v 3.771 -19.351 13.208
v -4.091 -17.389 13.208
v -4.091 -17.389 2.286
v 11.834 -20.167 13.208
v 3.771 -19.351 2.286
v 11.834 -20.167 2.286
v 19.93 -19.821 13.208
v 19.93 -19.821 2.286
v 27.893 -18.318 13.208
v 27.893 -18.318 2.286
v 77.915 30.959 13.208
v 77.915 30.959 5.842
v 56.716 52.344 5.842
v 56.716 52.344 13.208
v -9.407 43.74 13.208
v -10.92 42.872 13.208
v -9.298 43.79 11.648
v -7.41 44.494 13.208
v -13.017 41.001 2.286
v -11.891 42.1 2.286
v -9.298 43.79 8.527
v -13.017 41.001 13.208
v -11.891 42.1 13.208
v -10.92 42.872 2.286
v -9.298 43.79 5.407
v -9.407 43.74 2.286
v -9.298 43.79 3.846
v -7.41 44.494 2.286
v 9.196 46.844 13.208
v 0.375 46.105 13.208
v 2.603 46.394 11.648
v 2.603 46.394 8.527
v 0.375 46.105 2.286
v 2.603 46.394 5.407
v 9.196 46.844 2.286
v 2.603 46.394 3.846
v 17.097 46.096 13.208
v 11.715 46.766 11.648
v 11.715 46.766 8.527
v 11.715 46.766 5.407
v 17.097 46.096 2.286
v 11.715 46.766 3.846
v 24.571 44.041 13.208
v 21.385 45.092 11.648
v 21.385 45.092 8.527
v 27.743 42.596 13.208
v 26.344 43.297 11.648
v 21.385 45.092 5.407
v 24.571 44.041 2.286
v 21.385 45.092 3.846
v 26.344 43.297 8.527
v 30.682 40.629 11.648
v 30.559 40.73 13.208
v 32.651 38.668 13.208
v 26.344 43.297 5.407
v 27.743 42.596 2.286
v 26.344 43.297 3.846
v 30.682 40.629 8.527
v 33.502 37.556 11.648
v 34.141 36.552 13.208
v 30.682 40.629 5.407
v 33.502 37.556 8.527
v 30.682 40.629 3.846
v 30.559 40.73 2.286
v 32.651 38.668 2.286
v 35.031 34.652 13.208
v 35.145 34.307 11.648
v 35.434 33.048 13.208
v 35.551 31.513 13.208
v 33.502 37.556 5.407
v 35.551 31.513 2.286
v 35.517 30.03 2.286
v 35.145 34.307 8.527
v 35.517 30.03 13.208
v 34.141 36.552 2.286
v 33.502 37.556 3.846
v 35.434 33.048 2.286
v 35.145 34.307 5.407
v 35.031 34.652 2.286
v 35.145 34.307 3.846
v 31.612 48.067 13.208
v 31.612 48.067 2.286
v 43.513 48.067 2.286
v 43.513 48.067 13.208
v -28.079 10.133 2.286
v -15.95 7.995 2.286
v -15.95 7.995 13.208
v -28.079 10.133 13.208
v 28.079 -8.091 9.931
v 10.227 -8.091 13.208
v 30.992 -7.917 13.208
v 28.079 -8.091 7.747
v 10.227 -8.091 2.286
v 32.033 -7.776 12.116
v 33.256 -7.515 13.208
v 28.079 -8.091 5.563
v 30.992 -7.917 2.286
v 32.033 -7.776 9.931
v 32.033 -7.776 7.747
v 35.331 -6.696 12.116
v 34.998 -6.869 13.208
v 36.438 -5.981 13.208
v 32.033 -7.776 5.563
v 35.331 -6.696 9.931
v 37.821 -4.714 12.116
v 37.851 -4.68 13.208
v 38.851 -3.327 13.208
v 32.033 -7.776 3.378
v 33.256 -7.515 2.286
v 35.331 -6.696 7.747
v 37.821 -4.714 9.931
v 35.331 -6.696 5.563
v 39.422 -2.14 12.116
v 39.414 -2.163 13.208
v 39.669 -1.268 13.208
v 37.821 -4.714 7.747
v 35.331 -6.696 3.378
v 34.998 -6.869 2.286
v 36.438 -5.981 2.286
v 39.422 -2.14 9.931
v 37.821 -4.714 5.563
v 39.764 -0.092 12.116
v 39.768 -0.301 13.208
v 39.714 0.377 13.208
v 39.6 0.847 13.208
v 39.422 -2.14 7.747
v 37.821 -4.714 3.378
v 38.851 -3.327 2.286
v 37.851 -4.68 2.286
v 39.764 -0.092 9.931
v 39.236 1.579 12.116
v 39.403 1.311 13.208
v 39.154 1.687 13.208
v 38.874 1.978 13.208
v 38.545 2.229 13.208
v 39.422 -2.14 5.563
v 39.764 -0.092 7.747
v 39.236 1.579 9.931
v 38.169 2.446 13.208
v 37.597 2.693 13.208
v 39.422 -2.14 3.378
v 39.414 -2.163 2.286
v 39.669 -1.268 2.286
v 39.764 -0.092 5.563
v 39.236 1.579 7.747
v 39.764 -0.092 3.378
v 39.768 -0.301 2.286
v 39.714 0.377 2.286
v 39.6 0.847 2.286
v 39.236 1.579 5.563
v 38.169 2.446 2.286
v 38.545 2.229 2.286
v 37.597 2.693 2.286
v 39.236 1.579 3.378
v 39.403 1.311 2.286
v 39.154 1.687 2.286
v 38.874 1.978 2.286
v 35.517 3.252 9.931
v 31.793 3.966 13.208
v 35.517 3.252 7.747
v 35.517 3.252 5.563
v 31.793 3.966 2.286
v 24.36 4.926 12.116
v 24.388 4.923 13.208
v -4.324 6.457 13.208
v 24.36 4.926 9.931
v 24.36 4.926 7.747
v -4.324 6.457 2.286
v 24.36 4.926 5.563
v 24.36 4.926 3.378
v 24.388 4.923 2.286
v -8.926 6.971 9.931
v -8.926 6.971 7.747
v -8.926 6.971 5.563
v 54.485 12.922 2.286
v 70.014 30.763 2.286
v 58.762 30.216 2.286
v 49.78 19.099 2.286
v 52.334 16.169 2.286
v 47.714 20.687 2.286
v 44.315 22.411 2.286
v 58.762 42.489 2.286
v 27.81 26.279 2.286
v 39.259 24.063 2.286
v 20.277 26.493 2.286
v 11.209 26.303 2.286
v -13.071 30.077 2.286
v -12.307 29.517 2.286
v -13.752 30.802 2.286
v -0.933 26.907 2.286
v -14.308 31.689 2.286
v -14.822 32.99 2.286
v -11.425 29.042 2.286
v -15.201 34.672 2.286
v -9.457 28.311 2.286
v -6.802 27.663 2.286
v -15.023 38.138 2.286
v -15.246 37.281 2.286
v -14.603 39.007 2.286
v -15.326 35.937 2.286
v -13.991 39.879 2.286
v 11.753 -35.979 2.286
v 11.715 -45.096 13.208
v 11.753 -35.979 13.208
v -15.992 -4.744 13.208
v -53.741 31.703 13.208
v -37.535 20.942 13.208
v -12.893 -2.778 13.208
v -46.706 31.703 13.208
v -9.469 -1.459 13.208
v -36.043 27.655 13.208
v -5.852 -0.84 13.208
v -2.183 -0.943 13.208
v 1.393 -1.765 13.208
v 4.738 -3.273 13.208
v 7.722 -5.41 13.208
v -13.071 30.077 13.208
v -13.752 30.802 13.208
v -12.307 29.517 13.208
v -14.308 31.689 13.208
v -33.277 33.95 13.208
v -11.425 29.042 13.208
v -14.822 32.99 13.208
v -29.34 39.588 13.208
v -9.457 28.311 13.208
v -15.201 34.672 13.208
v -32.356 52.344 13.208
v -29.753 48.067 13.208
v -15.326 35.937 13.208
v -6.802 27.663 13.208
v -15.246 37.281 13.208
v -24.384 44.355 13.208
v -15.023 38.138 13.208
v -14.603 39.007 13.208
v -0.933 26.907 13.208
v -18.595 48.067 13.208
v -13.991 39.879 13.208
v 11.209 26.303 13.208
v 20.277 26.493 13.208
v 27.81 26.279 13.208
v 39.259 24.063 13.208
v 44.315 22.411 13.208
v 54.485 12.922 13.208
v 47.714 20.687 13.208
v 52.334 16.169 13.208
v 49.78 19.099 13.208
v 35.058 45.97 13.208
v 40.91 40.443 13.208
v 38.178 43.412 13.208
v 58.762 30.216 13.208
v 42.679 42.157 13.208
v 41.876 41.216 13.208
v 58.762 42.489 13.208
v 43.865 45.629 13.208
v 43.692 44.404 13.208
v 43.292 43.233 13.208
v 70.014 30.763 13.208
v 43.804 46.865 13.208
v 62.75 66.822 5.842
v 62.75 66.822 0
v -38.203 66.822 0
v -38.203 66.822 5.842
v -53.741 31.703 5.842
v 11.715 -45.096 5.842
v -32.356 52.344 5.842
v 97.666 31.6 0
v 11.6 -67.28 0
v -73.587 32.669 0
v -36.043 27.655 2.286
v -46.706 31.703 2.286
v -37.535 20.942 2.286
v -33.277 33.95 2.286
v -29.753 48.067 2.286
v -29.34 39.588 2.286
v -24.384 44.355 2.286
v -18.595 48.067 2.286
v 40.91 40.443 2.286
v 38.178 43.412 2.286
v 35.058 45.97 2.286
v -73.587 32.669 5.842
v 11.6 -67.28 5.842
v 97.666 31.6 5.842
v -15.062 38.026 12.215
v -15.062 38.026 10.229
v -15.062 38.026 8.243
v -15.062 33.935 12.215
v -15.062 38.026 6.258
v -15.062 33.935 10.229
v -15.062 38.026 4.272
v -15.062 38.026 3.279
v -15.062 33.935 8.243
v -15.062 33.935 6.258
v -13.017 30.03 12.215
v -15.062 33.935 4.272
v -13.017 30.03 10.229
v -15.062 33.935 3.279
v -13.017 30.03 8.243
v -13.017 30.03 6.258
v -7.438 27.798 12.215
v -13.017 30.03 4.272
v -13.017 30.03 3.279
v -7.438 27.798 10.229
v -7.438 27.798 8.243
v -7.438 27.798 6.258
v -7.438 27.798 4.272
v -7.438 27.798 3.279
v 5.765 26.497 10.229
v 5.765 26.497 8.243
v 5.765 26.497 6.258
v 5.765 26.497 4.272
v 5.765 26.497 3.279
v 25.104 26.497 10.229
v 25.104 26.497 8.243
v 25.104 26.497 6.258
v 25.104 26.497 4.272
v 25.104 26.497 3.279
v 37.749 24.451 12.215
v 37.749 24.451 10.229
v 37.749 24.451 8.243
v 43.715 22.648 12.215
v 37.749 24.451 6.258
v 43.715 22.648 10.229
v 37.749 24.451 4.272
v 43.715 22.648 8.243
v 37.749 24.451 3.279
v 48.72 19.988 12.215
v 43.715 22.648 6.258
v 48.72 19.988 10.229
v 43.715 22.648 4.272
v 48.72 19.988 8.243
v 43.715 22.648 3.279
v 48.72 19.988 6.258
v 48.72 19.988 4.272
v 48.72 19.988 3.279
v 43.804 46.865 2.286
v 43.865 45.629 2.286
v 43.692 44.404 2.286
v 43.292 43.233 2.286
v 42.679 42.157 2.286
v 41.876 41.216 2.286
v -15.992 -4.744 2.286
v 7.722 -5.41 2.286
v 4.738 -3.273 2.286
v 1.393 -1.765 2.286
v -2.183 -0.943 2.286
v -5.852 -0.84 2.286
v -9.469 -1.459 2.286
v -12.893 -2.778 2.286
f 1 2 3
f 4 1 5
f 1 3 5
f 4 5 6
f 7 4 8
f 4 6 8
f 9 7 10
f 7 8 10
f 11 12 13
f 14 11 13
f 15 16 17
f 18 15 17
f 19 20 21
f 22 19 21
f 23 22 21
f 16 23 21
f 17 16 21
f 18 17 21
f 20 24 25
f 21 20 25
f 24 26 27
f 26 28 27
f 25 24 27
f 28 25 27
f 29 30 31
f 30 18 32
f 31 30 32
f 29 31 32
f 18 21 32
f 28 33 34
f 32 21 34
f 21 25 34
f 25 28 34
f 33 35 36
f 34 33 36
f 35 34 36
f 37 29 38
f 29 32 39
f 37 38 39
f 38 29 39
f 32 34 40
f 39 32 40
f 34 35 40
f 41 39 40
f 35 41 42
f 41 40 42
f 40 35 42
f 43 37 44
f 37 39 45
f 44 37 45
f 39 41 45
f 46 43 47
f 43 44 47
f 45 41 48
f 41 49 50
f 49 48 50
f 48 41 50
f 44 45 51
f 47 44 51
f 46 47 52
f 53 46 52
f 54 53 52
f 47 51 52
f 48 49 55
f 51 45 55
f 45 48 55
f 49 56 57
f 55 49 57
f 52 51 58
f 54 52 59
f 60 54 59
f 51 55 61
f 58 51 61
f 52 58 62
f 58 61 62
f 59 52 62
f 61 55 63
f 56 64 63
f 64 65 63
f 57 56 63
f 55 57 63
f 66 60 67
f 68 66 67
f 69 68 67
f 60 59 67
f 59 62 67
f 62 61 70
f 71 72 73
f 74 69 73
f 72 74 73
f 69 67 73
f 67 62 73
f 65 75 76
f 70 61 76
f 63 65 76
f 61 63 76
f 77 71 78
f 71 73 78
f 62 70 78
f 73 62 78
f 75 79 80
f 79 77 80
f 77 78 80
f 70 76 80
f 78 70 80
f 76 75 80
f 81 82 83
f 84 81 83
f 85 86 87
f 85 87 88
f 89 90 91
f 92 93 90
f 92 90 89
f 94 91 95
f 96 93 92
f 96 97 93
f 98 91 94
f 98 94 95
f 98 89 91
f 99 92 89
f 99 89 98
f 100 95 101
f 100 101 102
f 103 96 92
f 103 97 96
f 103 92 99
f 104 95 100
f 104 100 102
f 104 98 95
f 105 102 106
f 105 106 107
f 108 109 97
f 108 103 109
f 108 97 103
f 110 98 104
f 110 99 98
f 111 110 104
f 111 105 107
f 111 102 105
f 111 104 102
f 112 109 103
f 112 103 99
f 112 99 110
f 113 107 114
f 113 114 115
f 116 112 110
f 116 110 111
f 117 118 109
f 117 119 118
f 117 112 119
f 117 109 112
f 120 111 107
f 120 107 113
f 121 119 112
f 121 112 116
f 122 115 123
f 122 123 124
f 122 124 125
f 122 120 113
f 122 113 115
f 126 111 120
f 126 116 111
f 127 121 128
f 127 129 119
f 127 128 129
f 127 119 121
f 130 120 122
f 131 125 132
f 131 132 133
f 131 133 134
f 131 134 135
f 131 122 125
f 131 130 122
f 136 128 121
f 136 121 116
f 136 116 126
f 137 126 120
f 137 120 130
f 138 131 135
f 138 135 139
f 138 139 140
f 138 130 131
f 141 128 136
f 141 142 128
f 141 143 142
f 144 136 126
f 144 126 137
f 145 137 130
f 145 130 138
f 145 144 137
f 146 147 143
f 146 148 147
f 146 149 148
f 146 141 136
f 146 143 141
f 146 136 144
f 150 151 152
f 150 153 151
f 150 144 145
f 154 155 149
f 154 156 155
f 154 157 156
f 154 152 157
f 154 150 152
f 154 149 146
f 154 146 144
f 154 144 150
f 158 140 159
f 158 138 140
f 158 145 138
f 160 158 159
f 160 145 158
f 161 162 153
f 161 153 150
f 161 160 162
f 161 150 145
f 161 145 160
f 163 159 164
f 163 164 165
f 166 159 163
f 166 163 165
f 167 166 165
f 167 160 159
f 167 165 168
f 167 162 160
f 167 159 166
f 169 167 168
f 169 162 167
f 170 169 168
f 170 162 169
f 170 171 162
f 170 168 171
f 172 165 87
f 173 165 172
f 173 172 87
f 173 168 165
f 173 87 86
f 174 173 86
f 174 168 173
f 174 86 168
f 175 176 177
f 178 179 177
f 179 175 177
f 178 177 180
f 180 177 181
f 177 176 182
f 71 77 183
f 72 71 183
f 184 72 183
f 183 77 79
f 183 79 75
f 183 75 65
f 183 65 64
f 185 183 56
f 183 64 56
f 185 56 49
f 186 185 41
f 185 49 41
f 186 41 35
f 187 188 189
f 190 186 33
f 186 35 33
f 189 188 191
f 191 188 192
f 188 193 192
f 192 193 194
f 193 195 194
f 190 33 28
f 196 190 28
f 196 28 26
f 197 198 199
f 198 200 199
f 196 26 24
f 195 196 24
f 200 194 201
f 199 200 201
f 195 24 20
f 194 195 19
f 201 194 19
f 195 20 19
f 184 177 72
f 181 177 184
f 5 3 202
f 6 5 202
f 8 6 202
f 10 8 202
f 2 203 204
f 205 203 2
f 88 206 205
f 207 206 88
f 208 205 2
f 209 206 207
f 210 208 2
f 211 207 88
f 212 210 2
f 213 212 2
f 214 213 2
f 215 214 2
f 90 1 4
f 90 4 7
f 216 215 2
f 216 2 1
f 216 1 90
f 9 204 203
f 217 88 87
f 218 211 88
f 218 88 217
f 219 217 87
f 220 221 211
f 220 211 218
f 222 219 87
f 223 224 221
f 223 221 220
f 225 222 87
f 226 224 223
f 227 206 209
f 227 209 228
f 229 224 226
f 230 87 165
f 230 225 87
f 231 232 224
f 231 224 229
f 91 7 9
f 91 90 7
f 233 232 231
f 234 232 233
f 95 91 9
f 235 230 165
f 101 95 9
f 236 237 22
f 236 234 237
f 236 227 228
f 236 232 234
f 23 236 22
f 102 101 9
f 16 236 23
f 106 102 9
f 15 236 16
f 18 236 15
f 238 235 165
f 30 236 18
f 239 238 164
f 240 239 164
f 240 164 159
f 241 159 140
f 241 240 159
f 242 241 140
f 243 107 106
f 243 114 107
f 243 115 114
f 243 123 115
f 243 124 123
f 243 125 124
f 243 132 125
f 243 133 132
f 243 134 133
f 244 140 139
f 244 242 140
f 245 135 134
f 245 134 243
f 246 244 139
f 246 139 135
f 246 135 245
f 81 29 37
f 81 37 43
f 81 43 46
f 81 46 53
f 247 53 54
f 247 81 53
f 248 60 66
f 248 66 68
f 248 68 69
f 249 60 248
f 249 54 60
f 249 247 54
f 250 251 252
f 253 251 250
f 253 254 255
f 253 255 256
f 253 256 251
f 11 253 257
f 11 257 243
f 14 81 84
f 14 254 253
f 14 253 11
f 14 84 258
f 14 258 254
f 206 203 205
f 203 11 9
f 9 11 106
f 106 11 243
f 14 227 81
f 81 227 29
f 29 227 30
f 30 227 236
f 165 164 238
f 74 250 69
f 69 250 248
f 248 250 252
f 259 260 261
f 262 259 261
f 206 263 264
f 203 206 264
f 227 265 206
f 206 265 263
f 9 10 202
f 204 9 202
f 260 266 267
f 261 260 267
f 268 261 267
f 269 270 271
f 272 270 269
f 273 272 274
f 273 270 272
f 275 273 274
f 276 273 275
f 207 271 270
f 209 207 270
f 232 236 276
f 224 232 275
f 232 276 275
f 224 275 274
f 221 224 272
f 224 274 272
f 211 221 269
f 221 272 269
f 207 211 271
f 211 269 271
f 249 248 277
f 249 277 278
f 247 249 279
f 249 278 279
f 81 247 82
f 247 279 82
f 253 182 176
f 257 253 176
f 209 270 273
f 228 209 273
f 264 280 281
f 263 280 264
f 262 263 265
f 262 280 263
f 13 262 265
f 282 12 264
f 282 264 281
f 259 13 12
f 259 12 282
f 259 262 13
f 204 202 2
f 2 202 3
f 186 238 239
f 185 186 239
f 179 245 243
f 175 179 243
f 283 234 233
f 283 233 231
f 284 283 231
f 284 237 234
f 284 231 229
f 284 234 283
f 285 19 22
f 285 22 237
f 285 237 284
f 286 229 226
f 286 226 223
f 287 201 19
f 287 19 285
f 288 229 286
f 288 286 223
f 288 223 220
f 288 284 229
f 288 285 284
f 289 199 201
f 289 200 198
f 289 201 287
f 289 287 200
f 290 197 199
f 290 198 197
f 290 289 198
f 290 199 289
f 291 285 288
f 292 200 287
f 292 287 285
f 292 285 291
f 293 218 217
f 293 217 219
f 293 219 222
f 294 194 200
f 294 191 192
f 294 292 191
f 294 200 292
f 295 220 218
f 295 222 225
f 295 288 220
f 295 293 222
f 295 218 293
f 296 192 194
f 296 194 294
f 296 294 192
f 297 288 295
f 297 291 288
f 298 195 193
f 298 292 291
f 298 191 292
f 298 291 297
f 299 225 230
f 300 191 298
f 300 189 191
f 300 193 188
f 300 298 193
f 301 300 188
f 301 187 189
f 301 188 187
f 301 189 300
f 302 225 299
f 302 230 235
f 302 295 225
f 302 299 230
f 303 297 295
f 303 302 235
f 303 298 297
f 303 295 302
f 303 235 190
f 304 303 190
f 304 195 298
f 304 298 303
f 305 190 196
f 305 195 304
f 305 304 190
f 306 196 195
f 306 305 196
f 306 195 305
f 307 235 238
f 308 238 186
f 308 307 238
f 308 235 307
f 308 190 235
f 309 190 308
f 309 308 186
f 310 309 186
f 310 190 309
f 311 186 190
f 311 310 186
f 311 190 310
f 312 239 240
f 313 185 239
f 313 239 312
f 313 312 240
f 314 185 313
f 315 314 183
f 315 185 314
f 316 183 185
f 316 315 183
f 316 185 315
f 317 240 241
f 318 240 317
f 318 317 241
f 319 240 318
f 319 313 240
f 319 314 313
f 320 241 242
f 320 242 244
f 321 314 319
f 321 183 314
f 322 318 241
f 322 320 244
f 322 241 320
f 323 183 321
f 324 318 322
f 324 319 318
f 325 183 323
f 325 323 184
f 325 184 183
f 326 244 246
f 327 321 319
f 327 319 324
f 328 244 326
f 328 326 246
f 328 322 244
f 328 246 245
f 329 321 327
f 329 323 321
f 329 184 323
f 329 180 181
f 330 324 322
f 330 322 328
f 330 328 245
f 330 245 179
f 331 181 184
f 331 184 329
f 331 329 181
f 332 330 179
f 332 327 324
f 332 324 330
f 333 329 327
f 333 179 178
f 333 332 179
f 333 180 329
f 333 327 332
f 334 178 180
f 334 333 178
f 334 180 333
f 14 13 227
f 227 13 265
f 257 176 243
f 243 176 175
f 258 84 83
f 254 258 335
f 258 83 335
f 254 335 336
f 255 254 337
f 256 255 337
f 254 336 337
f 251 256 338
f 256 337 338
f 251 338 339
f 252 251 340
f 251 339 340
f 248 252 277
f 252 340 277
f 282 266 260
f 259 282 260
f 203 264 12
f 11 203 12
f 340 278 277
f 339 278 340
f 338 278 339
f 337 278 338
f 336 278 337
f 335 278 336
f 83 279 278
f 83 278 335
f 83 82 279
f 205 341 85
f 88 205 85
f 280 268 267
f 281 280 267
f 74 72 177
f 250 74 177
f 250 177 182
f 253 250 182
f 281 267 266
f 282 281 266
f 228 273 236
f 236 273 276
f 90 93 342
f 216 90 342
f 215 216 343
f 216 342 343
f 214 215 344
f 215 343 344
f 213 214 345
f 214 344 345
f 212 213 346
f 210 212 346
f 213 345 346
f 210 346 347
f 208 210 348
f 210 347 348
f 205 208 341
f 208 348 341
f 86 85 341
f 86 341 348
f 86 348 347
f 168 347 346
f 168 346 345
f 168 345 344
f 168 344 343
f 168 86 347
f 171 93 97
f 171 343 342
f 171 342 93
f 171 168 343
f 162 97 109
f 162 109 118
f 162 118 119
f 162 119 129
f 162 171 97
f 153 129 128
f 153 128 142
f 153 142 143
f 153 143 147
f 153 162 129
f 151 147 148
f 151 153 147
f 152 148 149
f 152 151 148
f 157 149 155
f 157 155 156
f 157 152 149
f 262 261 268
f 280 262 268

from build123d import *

# Parameters (mm, degrees)
F1_DEPTH = 13.208
F3_DEPTH = 5.842
F4_DEPTH = 2.286


with BuildPart() as f1:
    # F0 (on Top) → F1 (new body)
    with BuildSketch(Plane.XY):
        Polygon((-32.3560461402, 52.3441955447), (-53.7407882512, 31.7032672465), (11.7151224986, -45.0958572328), (77.9148489237, 30.9594497085), (56.7160658538, 52.3441955447), align=None)
        with BuildLine():
            Line((11.7534588652, -35.9788919642), (-4.0909931995, -17.3886679113))
            ThreePointArc((-4.0909931995, -17.3886679113), (11.8338253195, -20.1670289266), (27.8931483626, -18.3184407651))
            Line((27.8931483626, -18.3184407651), (11.7534588652, -35.9788919642))
        make_face(mode=Mode.SUBTRACT)
        with BuildLine():
            Line((-15.9920677543, -4.7437758185), (-28.0790962279, 10.132567957))
            add(Edge.make_bspline(
                [(10.2274892852, -8.0909533426), (12.1311980321, -8.0811949568), (16.6056392449, -8.0582590306), (28.0675694172, -8.260866764), (35.4281055247, -7.6163836537), (40.0045754864, -2.566455147), (39.8246795693, 2.1720673748), (35.0407493301, 3.4771529183), (23.8681432212, 5.3426673719), (7.5880009118, 5.5207412488), (-9.0300836632, 6.6406913012), (-21.5775197413, 8.9407632332), (-28.0790962279, 10.132567957)],
                knots=[0, 0, 0, 0, 0.0811549252, 0.1907450089, 0.2784552829, 0.3583205454, 0.4206023983, 0.4857819839, 0.5941913826, 0.7255593555, 0.8577959011, 1, 1, 1, 1], degree=3))
            ThreePointArc((10.2274892852, -8.0909533426), (-2.1833926559, -0.9426747631), (-15.9920677543, -4.7437758185))
        make_face(mode=Mode.SUBTRACT)
        with BuildLine():
            Line((-29.7526847571, 48.0672456324), (-18.5954272747, 48.0672456324))
            ThreePointArc((-18.5954272747, 48.0672456324), (-31.4465122391, 36.8656402663), (-37.5345167614, 20.9419928048))
            Line((-37.5345167614, 20.9419928048), (-46.7063533439, 31.7032672465))
            Line((-46.7063533439, 31.7032672465), (-29.7526847571, 48.0672456324))
        make_face(mode=Mode.SUBTRACT)
        with BuildLine():
            add(Edge.make_bspline(
                [(-13.0167985335, 41.0009808838), (-13.8484287107, 40.082814319), (-15.565289774, 38.1873029874), (-15.2606426357, 33.832747479), (-13.5885583121, 29.386468667), (-7.2525242916, 27.6423436933), (-2.5756386001, 26.9695936321), (5.9646033503, 26.4396631967), (15.9087676241, 26.1157582849), (25.1839117973, 26.9753343414), (37.7399966402, 24.7556338977), (49.363974562, 21.0330861798), (52.8536560426, 15.5053545774), (54.4846132398, 12.9218827933)],
                knots=[0, 0, 0, 0, 0.0636774795, 0.1314591366, 0.201820557, 0.2839645461, 0.3580831489, 0.4551315435, 0.5613340532, 0.6635288988, 0.7834677165, 0.8988002521, 1, 1, 1, 1], degree=3))
            add(Edge.make_bspline(
                [(-13.0167985335, 41.0009808838), (-12.0481296696, 41.9921143662), (-9.5113733669, 44.5877011576), (2.9405575009, 46.6337667098), (11.5743267132, 47.1006613705), (21.4859282328, 45.4716097171), (31.0408798749, 41.5633506366), (35.6975262534, 34.5926167833), (35.5712002648, 31.3947542592), (35.5172753334, 30.0296787173)],
                knots=[0, 0, 0, 0, 0.1085428993, 0.2842528487, 0.4362761442, 0.593978359, 0.7556477926, 0.8956930701, 1, 1, 1, 1], degree=3))
            Line((35.5172753334, 30.0296787173), (58.7615631521, 30.2156321704))
            Line((58.7615631521, 30.2156321704), (58.7615631521, 42.4886159599))
            Line((58.7615631521, 42.4886159599), (70.0138553039, 30.763063347))
            Line((70.0138553039, 30.763063347), (54.4846132398, 12.9218827933))
        make_face(mode=Mode.SUBTRACT)
        with BuildLine():
            ThreePointArc((40.9099496901, 40.4431186616), (36.6630872067, 44.7454214943), (31.6122323275, 48.0672456324))
            Line((31.6122323275, 48.0672456324), (43.5133092105, 48.0672456324))
            ThreePointArc((43.5133092105, 48.0672456324), (43.519577812, 43.8085657891), (40.9099496901, 40.4431186616))
        make_face(mode=Mode.SUBTRACT)
    extrude(amount=F1_DEPTH)

    # F2 (on Top) → F3 (join)
    with BuildSketch(Plane.XY):
        Polygon((-73.5871798547, 32.6692324465), (11.5997663014, -67.2802267683), (97.6663614689, 31.5996578829), (62.750120097, 66.8221961218), (-38.2034844139, 66.8221961218), align=None)
        Polygon((11.7151224986, -45.0958572328), (-53.7407882512, 31.7032672465), (-32.3560461402, 52.3441955447), (56.7160658538, 52.3441955447), (77.9148489237, 30.9594497085), align=None, mode=Mode.SUBTRACT)
    extrude(amount=F3_DEPTH)

    # F0 (on Top) → F4 (join)
    with BuildSketch(Plane.XY):
        with BuildLine():
            add(Edge.make_bspline(
                [(-13.0167985335, 41.0009808838), (-12.0481296696, 41.9921143662), (-9.5113733669, 44.5877011576), (2.9405575009, 46.6337667098), (11.5743267132, 47.1006613705), (21.4859282328, 45.4716097171), (31.0408798749, 41.5633506366), (35.6975262534, 34.5926167833), (35.5712002648, 31.3947542592), (35.5172753334, 30.0296787173)],
                knots=[0, 0, 0, 0, 0.1085428993, 0.2842528487, 0.4362761442, 0.593978359, 0.7556477926, 0.8956930701, 1, 1, 1, 1], degree=3))
            add(Edge.make_bspline(
                [(-13.0167985335, 41.0009808838), (-13.8484287107, 40.082814319), (-15.565289774, 38.1873029874), (-15.2606426357, 33.832747479), (-13.5885583121, 29.386468667), (-7.2525242916, 27.6423436933), (-2.5756386001, 26.9695936321), (5.9646033503, 26.4396631967), (15.9087676241, 26.1157582849), (25.1839117973, 26.9753343414), (37.7399966402, 24.7556338977), (49.363974562, 21.0330861798), (52.8536560426, 15.5053545774), (54.4846132398, 12.9218827933)],
                knots=[0, 0, 0, 0, 0.0636774795, 0.1314591366, 0.201820557, 0.2839645461, 0.3580831489, 0.4551315435, 0.5613340532, 0.6635288988, 0.7834677165, 0.8988002521, 1, 1, 1, 1], degree=3))
            Line((54.4846132398, 12.9218827933), (70.0138553039, 30.763063347))
            Line((70.0138553039, 30.763063347), (58.7615631521, 42.4886159599))
            Line((58.7615631521, 42.4886159599), (58.7615631521, 30.2156321704))
            Line((58.7615631521, 30.2156321704), (35.5172753334, 30.0296787173))
        make_face()
        with BuildLine():
            ThreePointArc((-37.5345167614, 20.9419928048), (-31.4465122391, 36.8656402663), (-18.5954272747, 48.0672456324))
            Line((-18.5954272747, 48.0672456324), (-29.7526847571, 48.0672456324))
            Line((-29.7526847571, 48.0672456324), (-46.7063533439, 31.7032672465))
            Line((-46.7063533439, 31.7032672465), (-37.5345167614, 20.9419928048))
        make_face()
        with BuildLine():
            Line((43.5133092105, 48.0672456324), (31.6122323275, 48.0672456324))
            ThreePointArc((31.6122323275, 48.0672456324), (36.6630872067, 44.7454214943), (40.9099496901, 40.4431186616))
            ThreePointArc((40.9099496901, 40.4431186616), (43.519577812, 43.8085657891), (43.5133092105, 48.0672456324))
        make_face()
        with BuildLine():
            add(Edge.make_bspline(
                [(10.2274892852, -8.0909533426), (12.1311980321, -8.0811949568), (16.6056392449, -8.0582590306), (28.0675694172, -8.260866764), (35.4281055247, -7.6163836537), (40.0045754864, -2.566455147), (39.8246795693, 2.1720673748), (35.0407493301, 3.4771529183), (23.8681432212, 5.3426673719), (7.5880009118, 5.5207412488), (-9.0300836632, 6.6406913012), (-21.5775197413, 8.9407632332), (-28.0790962279, 10.132567957)],
                knots=[0, 0, 0, 0, 0.0811549252, 0.1907450089, 0.2784552829, 0.3583205454, 0.4206023983, 0.4857819839, 0.5941913826, 0.7255593555, 0.8577959011, 1, 1, 1, 1], degree=3))
            Line((-28.0790962279, 10.132567957), (-15.9920677543, -4.7437758185))
            ThreePointArc((-15.9920677543, -4.7437758185), (-2.1833926559, -0.9426747631), (10.2274892852, -8.0909533426))
        make_face()
        with BuildLine():
            ThreePointArc((27.8931483626, -18.3184407651), (11.8338253195, -20.1670289266), (-4.0909931995, -17.3886679113))
            Line((-4.0909931995, -17.3886679113), (11.7534588652, -35.9788919642))
            Line((11.7534588652, -35.9788919642), (27.8931483626, -18.3184407651))
        make_face()
    extrude(amount=F4_DEPTH)


solid = f1.part
